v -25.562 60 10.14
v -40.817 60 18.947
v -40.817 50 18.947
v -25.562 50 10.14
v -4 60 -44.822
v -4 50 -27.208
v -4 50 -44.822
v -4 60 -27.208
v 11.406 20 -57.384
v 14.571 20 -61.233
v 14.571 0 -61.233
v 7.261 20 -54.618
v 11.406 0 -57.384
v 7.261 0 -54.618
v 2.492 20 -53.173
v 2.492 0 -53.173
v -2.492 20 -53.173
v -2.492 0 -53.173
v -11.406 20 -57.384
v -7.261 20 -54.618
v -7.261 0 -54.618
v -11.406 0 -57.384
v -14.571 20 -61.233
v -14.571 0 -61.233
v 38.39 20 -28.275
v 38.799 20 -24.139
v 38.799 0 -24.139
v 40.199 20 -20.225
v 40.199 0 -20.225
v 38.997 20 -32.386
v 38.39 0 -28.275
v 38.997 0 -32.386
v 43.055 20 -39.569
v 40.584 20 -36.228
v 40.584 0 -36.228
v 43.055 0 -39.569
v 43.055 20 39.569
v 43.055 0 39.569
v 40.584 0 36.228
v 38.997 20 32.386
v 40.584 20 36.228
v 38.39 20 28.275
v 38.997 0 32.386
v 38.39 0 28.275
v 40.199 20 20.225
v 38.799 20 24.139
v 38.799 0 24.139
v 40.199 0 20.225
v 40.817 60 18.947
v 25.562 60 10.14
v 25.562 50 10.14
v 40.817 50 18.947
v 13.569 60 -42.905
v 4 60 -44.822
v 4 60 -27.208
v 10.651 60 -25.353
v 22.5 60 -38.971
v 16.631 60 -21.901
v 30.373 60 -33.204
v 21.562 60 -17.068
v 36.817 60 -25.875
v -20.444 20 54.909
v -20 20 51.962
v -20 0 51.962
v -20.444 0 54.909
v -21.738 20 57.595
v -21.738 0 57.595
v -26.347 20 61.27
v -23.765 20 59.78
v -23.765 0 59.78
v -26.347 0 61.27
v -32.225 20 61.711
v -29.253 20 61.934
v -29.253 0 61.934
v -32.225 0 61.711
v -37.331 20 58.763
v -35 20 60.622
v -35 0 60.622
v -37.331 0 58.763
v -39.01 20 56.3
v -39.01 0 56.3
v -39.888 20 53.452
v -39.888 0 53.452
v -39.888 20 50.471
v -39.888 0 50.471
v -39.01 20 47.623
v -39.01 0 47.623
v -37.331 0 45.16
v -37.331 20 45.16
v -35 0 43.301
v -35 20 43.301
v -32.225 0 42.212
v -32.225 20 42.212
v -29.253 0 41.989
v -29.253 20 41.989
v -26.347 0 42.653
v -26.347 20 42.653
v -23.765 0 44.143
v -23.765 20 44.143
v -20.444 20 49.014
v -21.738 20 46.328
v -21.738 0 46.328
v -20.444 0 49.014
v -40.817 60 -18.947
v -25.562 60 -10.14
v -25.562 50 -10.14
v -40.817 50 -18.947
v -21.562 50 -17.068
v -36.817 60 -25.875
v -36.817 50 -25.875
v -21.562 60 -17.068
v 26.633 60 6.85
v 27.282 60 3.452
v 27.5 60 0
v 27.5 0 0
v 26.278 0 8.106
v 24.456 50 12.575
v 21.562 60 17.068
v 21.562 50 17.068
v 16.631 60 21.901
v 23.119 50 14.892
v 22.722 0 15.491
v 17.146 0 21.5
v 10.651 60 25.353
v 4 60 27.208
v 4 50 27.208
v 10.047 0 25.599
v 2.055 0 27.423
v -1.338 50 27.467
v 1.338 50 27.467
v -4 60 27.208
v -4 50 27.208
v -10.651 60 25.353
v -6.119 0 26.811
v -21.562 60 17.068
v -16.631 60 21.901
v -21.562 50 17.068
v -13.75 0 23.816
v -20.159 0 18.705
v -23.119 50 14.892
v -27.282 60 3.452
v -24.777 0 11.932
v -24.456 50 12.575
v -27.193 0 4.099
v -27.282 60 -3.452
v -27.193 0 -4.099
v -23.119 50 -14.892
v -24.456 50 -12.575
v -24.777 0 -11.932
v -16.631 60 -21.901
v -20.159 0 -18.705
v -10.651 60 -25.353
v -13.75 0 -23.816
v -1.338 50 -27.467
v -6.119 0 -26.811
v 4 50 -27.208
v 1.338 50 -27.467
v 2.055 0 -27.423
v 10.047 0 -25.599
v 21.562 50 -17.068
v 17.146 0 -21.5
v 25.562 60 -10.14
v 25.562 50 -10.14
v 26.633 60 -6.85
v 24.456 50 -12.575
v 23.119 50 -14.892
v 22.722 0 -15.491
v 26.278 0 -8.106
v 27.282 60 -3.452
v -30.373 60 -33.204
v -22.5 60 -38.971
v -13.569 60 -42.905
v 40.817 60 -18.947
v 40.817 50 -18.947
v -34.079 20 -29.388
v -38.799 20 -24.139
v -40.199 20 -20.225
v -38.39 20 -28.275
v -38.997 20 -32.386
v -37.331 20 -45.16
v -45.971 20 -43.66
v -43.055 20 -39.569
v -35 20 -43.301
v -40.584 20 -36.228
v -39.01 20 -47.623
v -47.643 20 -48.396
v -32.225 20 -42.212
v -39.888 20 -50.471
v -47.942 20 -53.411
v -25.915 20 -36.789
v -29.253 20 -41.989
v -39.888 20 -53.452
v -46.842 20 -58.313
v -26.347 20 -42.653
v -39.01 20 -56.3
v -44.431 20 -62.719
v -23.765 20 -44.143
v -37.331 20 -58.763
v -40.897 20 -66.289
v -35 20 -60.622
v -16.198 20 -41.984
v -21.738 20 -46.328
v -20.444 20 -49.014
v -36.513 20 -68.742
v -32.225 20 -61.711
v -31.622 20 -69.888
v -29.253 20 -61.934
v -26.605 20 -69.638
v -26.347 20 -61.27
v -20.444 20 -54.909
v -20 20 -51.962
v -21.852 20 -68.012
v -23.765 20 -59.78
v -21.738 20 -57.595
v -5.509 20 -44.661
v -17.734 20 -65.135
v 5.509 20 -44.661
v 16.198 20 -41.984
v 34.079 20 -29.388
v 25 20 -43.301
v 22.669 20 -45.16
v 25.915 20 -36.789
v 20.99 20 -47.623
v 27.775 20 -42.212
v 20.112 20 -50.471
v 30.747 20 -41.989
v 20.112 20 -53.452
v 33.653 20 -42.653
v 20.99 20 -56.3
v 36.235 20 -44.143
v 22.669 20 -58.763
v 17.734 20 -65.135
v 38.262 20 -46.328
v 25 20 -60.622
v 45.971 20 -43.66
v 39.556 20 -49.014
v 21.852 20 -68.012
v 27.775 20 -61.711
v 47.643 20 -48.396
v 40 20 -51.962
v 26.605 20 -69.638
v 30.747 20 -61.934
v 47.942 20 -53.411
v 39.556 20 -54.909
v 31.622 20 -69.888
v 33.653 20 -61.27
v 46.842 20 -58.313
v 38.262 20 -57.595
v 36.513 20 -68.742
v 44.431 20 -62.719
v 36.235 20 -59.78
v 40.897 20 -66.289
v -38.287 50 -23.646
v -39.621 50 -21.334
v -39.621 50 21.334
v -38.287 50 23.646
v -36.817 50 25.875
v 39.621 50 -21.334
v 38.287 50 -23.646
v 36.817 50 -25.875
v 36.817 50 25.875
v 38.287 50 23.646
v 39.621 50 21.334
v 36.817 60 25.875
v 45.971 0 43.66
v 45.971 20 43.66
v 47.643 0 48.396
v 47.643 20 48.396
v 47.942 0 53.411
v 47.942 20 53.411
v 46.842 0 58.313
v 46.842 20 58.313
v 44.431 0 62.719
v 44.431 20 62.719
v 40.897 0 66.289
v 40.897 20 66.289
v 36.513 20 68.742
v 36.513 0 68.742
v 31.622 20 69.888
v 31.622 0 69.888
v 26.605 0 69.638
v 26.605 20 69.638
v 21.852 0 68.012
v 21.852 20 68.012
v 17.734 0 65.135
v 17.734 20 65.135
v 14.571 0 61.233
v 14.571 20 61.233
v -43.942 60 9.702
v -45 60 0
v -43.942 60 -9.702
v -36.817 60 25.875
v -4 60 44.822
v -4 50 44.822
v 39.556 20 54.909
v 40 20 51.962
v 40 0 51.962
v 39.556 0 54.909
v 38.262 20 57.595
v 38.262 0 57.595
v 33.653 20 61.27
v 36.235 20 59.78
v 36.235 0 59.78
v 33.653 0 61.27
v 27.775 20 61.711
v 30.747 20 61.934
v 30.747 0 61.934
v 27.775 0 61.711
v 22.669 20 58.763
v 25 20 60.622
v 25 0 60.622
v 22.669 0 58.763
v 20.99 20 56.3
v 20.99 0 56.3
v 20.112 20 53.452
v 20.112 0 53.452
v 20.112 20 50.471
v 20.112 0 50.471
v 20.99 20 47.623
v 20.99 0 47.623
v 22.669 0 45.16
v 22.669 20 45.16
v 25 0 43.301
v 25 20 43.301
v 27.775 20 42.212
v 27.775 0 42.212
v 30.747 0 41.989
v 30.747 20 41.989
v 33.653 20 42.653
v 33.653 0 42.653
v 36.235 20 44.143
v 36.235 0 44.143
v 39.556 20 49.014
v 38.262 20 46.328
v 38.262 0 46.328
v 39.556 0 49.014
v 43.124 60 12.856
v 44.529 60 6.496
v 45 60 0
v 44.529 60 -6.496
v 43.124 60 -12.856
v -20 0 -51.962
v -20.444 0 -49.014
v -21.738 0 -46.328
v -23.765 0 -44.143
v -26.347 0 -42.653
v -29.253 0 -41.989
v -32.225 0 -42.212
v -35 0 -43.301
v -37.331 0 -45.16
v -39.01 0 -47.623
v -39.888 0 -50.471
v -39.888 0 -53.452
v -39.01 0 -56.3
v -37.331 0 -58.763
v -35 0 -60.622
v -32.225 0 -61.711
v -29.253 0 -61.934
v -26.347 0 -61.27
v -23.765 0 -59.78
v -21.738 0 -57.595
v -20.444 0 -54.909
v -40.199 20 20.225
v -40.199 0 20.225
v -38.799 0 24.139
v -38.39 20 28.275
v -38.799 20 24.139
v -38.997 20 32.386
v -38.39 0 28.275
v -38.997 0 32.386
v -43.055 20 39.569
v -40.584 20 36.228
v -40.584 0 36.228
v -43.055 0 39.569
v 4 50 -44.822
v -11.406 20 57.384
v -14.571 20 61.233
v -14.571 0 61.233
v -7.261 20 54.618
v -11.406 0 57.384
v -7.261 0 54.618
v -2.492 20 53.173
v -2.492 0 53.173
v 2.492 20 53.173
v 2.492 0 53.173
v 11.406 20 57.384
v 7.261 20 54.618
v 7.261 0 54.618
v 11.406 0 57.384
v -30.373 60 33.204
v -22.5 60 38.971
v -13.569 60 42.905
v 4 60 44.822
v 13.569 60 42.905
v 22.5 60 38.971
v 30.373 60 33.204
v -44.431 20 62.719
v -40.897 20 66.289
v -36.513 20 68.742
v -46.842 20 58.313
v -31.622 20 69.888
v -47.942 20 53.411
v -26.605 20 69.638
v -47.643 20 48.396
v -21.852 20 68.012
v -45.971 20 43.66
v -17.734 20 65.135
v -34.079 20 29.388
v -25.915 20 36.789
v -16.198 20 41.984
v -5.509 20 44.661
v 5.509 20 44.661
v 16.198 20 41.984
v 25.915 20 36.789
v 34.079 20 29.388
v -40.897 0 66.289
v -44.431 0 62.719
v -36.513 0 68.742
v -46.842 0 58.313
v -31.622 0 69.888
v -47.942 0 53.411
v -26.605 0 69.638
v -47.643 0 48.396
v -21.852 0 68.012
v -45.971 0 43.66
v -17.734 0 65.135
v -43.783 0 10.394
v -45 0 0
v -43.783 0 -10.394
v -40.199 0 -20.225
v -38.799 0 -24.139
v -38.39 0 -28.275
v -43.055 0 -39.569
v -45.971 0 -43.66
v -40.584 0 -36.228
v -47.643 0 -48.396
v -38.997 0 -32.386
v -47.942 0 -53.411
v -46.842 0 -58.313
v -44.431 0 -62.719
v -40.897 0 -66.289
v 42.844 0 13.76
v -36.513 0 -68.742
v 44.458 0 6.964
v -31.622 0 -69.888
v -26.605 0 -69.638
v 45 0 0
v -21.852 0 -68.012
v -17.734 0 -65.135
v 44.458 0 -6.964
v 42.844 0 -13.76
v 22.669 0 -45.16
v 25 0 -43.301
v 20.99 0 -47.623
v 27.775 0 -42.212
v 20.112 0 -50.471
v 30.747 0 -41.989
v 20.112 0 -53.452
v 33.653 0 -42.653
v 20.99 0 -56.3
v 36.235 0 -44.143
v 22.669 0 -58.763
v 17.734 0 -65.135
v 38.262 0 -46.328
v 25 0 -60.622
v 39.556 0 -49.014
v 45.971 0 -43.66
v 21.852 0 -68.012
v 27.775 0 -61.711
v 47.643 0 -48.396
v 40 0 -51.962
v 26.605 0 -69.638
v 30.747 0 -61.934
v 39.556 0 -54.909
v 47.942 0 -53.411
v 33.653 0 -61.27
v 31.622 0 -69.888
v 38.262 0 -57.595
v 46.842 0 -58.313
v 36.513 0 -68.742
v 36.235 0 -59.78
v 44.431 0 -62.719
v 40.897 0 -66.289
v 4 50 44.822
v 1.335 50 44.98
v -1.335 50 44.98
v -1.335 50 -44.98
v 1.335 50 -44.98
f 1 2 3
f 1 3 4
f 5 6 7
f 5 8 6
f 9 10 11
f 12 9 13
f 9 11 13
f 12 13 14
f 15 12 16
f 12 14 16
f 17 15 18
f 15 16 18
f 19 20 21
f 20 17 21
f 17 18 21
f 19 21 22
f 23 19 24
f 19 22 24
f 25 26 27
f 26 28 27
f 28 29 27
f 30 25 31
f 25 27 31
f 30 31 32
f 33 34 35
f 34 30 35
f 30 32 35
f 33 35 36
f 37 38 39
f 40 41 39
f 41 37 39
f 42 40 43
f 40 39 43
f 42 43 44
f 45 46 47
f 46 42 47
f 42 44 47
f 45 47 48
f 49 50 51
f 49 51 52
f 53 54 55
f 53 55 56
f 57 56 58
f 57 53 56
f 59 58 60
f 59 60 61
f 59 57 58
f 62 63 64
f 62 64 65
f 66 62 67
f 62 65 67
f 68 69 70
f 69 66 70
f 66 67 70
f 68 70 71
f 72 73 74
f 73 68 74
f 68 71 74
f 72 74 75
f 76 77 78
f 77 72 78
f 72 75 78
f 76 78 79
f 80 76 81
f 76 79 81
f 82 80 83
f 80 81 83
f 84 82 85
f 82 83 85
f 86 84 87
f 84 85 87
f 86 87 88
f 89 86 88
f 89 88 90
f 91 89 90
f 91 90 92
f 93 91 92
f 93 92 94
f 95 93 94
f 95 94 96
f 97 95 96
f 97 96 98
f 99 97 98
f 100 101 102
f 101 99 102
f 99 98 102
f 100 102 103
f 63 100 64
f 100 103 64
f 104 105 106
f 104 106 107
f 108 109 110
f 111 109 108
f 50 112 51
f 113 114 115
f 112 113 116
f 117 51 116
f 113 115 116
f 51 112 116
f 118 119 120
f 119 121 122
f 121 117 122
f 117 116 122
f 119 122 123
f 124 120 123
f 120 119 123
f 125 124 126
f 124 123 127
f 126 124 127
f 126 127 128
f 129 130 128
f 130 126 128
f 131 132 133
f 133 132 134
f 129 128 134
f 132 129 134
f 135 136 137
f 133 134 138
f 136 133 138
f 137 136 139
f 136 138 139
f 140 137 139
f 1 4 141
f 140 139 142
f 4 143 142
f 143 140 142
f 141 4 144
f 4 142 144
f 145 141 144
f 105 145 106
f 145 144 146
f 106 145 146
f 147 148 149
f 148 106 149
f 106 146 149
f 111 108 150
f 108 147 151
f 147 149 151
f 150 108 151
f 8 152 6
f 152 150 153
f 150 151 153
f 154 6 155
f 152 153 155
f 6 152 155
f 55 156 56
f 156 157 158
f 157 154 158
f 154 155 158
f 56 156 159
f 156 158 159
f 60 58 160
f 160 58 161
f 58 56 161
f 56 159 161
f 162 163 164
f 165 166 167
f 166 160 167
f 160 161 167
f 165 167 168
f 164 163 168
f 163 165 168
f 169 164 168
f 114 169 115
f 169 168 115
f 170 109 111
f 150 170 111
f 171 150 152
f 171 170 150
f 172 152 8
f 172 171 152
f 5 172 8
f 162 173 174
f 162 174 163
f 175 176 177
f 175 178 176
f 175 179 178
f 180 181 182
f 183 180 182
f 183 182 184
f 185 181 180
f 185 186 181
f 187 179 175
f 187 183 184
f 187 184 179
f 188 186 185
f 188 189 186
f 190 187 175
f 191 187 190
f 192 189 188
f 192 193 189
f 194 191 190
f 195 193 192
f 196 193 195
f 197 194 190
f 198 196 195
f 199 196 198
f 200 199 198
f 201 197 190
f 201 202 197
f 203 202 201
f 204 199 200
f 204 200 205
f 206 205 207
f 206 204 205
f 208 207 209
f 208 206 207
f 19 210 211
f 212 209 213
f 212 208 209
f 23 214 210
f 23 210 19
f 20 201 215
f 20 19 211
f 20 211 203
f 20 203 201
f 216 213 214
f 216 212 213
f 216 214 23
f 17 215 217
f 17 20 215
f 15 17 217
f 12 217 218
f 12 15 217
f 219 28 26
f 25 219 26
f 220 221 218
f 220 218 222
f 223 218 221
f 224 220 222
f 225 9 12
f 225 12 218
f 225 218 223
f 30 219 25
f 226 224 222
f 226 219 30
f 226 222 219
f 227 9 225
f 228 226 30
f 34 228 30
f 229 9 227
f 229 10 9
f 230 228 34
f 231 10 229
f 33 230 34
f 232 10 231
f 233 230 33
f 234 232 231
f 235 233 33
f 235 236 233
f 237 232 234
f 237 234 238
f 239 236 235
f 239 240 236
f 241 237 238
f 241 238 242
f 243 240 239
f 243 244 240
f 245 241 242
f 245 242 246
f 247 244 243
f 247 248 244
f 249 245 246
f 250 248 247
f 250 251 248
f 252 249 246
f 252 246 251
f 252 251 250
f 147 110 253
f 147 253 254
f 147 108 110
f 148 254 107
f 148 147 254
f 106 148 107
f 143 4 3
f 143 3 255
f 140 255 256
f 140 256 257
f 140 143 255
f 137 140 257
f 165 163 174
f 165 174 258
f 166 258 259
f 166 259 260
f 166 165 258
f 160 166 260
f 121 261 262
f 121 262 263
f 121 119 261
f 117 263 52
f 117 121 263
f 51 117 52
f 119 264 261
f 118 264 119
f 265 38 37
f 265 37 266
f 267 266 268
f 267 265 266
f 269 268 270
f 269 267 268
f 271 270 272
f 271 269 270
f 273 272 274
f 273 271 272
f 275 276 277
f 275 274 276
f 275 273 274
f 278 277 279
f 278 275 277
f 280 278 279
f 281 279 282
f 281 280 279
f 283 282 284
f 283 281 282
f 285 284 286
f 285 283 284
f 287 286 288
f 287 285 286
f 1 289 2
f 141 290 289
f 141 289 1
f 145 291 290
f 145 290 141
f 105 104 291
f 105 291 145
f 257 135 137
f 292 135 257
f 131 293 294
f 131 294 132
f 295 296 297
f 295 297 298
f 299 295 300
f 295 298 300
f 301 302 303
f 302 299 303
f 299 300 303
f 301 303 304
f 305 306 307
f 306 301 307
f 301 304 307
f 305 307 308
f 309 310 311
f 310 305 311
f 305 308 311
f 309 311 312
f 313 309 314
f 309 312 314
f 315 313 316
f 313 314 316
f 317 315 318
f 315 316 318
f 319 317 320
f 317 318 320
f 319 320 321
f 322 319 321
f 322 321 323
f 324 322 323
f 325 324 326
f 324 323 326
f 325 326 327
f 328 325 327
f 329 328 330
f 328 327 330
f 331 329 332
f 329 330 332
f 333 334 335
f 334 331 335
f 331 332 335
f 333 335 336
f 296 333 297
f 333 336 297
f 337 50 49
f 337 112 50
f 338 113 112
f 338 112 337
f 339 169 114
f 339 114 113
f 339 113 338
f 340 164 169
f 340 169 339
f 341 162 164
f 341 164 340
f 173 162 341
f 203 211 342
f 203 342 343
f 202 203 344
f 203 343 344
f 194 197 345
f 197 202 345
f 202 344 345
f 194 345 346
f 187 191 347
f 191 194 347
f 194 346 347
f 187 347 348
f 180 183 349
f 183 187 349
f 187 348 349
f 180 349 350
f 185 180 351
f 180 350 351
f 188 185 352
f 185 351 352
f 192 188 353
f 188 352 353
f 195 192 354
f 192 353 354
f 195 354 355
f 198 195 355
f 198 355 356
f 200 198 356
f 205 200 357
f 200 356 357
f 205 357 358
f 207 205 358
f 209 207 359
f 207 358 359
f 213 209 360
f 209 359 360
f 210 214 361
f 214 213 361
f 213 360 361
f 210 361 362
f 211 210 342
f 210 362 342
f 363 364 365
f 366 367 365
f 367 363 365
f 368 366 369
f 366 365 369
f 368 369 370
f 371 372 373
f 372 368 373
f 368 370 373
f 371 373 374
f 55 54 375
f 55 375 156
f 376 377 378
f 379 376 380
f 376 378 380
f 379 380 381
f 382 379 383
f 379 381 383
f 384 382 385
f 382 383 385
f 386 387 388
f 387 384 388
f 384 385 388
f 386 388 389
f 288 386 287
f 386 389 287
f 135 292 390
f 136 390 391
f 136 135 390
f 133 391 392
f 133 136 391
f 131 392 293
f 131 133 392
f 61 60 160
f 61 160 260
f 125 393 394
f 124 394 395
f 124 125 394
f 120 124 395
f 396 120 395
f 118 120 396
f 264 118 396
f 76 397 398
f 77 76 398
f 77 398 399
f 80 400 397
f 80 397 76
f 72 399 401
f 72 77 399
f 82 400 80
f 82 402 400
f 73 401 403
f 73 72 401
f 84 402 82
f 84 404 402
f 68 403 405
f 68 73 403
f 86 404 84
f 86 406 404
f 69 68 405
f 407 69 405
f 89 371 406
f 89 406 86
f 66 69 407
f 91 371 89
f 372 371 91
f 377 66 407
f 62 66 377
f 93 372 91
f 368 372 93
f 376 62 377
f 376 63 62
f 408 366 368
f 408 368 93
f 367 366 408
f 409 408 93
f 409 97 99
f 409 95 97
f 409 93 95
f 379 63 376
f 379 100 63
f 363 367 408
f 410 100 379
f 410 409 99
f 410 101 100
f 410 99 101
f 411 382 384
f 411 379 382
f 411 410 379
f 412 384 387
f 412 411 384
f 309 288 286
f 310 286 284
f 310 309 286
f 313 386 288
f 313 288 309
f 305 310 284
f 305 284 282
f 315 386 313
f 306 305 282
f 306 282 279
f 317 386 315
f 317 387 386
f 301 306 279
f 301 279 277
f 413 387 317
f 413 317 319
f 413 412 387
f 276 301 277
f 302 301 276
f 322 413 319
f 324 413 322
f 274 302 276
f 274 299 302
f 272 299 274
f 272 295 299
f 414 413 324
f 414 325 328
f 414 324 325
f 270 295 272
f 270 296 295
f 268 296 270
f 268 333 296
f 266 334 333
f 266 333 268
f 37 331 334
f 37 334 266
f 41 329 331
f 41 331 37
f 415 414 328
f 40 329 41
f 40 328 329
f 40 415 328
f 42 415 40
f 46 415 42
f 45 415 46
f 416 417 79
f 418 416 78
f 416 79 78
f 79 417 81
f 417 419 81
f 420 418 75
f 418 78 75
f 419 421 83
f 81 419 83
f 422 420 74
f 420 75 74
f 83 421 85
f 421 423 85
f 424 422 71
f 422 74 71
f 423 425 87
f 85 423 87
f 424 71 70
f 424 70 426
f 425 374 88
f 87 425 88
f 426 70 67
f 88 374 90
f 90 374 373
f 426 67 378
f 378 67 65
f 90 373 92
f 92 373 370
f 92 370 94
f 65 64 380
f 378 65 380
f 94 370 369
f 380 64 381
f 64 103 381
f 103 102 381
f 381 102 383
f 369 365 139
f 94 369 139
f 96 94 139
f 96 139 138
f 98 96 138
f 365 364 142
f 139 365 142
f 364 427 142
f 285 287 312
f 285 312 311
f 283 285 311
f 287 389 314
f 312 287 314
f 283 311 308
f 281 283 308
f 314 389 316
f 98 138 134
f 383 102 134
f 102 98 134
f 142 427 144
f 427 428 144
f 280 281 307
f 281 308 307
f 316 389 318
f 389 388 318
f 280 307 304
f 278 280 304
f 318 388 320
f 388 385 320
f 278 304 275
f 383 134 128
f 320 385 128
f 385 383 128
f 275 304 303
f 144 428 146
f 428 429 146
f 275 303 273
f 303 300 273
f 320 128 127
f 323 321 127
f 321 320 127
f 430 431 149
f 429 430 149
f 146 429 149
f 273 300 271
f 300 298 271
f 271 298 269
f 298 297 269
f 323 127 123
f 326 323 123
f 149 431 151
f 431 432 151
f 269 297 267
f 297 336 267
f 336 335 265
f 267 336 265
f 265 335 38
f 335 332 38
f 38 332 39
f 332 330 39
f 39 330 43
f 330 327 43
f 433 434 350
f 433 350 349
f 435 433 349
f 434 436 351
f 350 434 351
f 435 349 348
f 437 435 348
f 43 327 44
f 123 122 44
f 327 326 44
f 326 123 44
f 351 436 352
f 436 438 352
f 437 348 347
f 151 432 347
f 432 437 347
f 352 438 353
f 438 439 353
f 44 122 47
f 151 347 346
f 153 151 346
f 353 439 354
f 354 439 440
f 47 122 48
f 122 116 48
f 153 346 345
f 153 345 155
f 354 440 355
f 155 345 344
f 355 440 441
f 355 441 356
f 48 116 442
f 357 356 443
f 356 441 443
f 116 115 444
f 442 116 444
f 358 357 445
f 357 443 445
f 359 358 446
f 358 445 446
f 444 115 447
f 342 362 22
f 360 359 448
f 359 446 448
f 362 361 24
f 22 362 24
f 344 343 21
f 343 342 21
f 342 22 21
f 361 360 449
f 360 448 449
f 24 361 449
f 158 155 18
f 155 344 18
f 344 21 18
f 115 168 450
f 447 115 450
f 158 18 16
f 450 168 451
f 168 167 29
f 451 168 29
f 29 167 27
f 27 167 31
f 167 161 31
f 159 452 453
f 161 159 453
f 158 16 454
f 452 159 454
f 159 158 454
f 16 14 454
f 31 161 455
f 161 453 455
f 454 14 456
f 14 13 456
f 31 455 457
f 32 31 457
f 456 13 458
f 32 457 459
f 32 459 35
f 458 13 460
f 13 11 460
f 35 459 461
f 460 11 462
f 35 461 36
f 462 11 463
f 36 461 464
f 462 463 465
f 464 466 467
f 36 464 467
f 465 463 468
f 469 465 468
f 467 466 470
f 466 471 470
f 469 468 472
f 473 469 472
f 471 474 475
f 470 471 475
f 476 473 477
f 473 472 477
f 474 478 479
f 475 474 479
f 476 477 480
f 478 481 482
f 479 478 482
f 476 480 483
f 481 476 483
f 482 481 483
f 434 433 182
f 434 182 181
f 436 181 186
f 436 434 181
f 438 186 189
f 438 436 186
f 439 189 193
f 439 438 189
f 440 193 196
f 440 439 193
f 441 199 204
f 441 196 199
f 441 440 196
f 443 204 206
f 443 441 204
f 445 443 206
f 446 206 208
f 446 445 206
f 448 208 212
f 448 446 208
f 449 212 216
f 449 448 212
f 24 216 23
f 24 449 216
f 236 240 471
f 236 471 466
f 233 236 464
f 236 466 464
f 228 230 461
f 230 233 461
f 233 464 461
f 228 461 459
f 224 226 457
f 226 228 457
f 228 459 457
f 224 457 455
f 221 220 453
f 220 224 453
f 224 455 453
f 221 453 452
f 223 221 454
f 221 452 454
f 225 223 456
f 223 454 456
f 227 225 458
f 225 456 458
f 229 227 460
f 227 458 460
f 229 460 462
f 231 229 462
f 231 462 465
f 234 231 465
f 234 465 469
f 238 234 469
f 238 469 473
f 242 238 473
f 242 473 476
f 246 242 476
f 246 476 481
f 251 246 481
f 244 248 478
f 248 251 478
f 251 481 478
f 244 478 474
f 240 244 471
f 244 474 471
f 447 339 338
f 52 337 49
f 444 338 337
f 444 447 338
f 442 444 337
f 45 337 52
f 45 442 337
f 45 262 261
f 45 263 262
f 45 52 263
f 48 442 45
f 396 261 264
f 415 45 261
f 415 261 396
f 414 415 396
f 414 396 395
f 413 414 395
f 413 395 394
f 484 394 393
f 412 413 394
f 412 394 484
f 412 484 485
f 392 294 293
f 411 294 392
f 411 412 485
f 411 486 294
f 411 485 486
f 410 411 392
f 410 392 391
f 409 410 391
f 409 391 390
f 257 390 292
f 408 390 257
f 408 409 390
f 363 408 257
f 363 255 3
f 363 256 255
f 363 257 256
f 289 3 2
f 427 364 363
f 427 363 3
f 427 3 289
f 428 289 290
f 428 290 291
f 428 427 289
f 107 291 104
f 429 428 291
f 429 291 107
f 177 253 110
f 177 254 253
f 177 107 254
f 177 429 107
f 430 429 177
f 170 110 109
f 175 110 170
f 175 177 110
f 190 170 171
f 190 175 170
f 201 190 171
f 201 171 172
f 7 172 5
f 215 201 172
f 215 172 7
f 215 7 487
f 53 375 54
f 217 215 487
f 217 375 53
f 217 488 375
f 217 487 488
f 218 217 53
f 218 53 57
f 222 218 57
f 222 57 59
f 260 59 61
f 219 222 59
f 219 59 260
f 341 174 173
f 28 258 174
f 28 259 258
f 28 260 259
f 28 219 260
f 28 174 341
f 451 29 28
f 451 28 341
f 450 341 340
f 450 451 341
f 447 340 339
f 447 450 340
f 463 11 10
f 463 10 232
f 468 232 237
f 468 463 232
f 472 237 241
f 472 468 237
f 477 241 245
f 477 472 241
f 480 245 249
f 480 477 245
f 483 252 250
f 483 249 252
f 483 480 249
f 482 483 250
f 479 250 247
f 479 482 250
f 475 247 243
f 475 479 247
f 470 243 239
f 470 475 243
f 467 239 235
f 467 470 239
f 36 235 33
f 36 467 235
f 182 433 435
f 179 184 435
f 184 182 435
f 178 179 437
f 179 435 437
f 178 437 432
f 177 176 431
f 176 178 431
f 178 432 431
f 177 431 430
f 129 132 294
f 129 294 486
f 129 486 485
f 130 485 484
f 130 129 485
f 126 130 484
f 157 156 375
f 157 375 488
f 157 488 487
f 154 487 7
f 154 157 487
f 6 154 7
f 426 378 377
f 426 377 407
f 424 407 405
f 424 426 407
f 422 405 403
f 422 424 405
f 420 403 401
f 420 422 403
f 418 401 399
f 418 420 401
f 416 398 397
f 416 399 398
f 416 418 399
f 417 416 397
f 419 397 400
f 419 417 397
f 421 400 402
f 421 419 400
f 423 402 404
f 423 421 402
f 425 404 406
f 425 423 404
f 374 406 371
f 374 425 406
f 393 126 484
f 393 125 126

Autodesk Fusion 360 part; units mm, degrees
sketch "Sketch1" plane through (0, 0, 0) normal (0, 1, 0) x (1, 0, 0)
  circle A0 centre (0, 0) radius 27.5
  circle A1 centre (0, 0) radius 45
  line L0 (0, 0) -> (110, 0) construction
  line L1 (0, 0) -> (0, 75) construction
  line L2 (0, 0) -> (-52.945, 91.7035) construction
  line L3 (0, 0) -> (105.89, 0) construction
  circle A2 centre (-30, 51.9615) radius 10
  circle A3 centre (30, 51.9615) radius 10
  arc A4 (-14.5714, 61.2329) -> (14.5714, 61.2329) centre (0, 69.9893) ccw
  arc A5 (-40.1988, 20.2252) -> (-43.0551, 39.5694) centre (-55.385, 27.8658) ccw
  arc A6 (43.0551, 39.5694) -> (40.1988, 20.2252) centre (55.385, 27.8658) ccw
  arc A7 (-14.5714, 61.2329) -> (-43.0551, 39.5694) centre (-30, 51.9615) ccw
  arc A8 (43.0551, 39.5694) -> (14.5714, 61.2329) centre (30, 51.9615) ccw
  arc A9 (-43.0551, -39.5694) -> (-40.1988, -20.2252) centre (-55.385, -27.8658) ccw
  arc A10 (-43.0551, -39.5694) -> (-14.5714, -61.2329) centre (-30, -51.9615) ccw
  arc A11 (14.5714, -61.2329) -> (-14.5714, -61.2329) centre (0, -69.9893) ccw
  arc A12 (14.5714, -61.2329) -> (43.0551, -39.5694) centre (30, -51.9615) ccw
  arc A13 (40.1988, -20.2252) -> (43.0551, -39.5694) centre (55.385, -27.8658) ccw
  circle A14 centre (30, -51.9615) radius 10
  circle A15 centre (-30, -51.9615) radius 10
  dimension "d1" = 55
  dimension "d2" = 90
  dimension "d3" = 120
  dimension "d4" = 20
  dimension "d5" = 36
  dimension "d6" = 60
  dimension "d7" = 17
  dimension "d8" = 17
  dimension "d9" = 17
extrude "Extrude1" add sketch "Sketch1" along normal blind 20 contours A1 A4 A5 A6 A7 A8 | A1 A9 A10 A11 A12 A13 makes body 1 at (39.1578, 13.3333, 22.1736) makes body 2 at (39.1578, 6.6667, -22.1736)
extrude "Extrude2" add sketch "Sketch1" along normal blind 60 contours A1 bodies 1 2
sketch "Sketch2" plane through (0, 60, 0) normal (0, 1, 0) x (-1, 0, 0)
  circle A0 centre (0, 0) radius 27.5
  circle A1 centre (0, 0) radius 45
  line L0 (-4, -22.5) -> (4, -22.5)
  line L1 (4, -22.5) -> (4, -47.5)
  line L2 (4, -47.5) -> (-4, -47.5)
  line L3 (-4, -47.5) -> (-4, -22.5)
  line L4 (-4, -22.5) -> (4, -47.5) construction
  line L5 (4, -22.5) -> (-4, -47.5) construction
  point P0 (0, -35)
  dimension "d14" = 8
  dimension "d15" = 25
extrude "Extrude3" cut sketch "Sketch2" against normal blind 10 contours A0 A1 L1 L3 picked at (-3.1125, -33.1656) bodies 1
pattern_circular "C-Pattern1" count 6 over 360 about axis through (0, 60, 0) along (0, -1, 0) of "Extrude3"
